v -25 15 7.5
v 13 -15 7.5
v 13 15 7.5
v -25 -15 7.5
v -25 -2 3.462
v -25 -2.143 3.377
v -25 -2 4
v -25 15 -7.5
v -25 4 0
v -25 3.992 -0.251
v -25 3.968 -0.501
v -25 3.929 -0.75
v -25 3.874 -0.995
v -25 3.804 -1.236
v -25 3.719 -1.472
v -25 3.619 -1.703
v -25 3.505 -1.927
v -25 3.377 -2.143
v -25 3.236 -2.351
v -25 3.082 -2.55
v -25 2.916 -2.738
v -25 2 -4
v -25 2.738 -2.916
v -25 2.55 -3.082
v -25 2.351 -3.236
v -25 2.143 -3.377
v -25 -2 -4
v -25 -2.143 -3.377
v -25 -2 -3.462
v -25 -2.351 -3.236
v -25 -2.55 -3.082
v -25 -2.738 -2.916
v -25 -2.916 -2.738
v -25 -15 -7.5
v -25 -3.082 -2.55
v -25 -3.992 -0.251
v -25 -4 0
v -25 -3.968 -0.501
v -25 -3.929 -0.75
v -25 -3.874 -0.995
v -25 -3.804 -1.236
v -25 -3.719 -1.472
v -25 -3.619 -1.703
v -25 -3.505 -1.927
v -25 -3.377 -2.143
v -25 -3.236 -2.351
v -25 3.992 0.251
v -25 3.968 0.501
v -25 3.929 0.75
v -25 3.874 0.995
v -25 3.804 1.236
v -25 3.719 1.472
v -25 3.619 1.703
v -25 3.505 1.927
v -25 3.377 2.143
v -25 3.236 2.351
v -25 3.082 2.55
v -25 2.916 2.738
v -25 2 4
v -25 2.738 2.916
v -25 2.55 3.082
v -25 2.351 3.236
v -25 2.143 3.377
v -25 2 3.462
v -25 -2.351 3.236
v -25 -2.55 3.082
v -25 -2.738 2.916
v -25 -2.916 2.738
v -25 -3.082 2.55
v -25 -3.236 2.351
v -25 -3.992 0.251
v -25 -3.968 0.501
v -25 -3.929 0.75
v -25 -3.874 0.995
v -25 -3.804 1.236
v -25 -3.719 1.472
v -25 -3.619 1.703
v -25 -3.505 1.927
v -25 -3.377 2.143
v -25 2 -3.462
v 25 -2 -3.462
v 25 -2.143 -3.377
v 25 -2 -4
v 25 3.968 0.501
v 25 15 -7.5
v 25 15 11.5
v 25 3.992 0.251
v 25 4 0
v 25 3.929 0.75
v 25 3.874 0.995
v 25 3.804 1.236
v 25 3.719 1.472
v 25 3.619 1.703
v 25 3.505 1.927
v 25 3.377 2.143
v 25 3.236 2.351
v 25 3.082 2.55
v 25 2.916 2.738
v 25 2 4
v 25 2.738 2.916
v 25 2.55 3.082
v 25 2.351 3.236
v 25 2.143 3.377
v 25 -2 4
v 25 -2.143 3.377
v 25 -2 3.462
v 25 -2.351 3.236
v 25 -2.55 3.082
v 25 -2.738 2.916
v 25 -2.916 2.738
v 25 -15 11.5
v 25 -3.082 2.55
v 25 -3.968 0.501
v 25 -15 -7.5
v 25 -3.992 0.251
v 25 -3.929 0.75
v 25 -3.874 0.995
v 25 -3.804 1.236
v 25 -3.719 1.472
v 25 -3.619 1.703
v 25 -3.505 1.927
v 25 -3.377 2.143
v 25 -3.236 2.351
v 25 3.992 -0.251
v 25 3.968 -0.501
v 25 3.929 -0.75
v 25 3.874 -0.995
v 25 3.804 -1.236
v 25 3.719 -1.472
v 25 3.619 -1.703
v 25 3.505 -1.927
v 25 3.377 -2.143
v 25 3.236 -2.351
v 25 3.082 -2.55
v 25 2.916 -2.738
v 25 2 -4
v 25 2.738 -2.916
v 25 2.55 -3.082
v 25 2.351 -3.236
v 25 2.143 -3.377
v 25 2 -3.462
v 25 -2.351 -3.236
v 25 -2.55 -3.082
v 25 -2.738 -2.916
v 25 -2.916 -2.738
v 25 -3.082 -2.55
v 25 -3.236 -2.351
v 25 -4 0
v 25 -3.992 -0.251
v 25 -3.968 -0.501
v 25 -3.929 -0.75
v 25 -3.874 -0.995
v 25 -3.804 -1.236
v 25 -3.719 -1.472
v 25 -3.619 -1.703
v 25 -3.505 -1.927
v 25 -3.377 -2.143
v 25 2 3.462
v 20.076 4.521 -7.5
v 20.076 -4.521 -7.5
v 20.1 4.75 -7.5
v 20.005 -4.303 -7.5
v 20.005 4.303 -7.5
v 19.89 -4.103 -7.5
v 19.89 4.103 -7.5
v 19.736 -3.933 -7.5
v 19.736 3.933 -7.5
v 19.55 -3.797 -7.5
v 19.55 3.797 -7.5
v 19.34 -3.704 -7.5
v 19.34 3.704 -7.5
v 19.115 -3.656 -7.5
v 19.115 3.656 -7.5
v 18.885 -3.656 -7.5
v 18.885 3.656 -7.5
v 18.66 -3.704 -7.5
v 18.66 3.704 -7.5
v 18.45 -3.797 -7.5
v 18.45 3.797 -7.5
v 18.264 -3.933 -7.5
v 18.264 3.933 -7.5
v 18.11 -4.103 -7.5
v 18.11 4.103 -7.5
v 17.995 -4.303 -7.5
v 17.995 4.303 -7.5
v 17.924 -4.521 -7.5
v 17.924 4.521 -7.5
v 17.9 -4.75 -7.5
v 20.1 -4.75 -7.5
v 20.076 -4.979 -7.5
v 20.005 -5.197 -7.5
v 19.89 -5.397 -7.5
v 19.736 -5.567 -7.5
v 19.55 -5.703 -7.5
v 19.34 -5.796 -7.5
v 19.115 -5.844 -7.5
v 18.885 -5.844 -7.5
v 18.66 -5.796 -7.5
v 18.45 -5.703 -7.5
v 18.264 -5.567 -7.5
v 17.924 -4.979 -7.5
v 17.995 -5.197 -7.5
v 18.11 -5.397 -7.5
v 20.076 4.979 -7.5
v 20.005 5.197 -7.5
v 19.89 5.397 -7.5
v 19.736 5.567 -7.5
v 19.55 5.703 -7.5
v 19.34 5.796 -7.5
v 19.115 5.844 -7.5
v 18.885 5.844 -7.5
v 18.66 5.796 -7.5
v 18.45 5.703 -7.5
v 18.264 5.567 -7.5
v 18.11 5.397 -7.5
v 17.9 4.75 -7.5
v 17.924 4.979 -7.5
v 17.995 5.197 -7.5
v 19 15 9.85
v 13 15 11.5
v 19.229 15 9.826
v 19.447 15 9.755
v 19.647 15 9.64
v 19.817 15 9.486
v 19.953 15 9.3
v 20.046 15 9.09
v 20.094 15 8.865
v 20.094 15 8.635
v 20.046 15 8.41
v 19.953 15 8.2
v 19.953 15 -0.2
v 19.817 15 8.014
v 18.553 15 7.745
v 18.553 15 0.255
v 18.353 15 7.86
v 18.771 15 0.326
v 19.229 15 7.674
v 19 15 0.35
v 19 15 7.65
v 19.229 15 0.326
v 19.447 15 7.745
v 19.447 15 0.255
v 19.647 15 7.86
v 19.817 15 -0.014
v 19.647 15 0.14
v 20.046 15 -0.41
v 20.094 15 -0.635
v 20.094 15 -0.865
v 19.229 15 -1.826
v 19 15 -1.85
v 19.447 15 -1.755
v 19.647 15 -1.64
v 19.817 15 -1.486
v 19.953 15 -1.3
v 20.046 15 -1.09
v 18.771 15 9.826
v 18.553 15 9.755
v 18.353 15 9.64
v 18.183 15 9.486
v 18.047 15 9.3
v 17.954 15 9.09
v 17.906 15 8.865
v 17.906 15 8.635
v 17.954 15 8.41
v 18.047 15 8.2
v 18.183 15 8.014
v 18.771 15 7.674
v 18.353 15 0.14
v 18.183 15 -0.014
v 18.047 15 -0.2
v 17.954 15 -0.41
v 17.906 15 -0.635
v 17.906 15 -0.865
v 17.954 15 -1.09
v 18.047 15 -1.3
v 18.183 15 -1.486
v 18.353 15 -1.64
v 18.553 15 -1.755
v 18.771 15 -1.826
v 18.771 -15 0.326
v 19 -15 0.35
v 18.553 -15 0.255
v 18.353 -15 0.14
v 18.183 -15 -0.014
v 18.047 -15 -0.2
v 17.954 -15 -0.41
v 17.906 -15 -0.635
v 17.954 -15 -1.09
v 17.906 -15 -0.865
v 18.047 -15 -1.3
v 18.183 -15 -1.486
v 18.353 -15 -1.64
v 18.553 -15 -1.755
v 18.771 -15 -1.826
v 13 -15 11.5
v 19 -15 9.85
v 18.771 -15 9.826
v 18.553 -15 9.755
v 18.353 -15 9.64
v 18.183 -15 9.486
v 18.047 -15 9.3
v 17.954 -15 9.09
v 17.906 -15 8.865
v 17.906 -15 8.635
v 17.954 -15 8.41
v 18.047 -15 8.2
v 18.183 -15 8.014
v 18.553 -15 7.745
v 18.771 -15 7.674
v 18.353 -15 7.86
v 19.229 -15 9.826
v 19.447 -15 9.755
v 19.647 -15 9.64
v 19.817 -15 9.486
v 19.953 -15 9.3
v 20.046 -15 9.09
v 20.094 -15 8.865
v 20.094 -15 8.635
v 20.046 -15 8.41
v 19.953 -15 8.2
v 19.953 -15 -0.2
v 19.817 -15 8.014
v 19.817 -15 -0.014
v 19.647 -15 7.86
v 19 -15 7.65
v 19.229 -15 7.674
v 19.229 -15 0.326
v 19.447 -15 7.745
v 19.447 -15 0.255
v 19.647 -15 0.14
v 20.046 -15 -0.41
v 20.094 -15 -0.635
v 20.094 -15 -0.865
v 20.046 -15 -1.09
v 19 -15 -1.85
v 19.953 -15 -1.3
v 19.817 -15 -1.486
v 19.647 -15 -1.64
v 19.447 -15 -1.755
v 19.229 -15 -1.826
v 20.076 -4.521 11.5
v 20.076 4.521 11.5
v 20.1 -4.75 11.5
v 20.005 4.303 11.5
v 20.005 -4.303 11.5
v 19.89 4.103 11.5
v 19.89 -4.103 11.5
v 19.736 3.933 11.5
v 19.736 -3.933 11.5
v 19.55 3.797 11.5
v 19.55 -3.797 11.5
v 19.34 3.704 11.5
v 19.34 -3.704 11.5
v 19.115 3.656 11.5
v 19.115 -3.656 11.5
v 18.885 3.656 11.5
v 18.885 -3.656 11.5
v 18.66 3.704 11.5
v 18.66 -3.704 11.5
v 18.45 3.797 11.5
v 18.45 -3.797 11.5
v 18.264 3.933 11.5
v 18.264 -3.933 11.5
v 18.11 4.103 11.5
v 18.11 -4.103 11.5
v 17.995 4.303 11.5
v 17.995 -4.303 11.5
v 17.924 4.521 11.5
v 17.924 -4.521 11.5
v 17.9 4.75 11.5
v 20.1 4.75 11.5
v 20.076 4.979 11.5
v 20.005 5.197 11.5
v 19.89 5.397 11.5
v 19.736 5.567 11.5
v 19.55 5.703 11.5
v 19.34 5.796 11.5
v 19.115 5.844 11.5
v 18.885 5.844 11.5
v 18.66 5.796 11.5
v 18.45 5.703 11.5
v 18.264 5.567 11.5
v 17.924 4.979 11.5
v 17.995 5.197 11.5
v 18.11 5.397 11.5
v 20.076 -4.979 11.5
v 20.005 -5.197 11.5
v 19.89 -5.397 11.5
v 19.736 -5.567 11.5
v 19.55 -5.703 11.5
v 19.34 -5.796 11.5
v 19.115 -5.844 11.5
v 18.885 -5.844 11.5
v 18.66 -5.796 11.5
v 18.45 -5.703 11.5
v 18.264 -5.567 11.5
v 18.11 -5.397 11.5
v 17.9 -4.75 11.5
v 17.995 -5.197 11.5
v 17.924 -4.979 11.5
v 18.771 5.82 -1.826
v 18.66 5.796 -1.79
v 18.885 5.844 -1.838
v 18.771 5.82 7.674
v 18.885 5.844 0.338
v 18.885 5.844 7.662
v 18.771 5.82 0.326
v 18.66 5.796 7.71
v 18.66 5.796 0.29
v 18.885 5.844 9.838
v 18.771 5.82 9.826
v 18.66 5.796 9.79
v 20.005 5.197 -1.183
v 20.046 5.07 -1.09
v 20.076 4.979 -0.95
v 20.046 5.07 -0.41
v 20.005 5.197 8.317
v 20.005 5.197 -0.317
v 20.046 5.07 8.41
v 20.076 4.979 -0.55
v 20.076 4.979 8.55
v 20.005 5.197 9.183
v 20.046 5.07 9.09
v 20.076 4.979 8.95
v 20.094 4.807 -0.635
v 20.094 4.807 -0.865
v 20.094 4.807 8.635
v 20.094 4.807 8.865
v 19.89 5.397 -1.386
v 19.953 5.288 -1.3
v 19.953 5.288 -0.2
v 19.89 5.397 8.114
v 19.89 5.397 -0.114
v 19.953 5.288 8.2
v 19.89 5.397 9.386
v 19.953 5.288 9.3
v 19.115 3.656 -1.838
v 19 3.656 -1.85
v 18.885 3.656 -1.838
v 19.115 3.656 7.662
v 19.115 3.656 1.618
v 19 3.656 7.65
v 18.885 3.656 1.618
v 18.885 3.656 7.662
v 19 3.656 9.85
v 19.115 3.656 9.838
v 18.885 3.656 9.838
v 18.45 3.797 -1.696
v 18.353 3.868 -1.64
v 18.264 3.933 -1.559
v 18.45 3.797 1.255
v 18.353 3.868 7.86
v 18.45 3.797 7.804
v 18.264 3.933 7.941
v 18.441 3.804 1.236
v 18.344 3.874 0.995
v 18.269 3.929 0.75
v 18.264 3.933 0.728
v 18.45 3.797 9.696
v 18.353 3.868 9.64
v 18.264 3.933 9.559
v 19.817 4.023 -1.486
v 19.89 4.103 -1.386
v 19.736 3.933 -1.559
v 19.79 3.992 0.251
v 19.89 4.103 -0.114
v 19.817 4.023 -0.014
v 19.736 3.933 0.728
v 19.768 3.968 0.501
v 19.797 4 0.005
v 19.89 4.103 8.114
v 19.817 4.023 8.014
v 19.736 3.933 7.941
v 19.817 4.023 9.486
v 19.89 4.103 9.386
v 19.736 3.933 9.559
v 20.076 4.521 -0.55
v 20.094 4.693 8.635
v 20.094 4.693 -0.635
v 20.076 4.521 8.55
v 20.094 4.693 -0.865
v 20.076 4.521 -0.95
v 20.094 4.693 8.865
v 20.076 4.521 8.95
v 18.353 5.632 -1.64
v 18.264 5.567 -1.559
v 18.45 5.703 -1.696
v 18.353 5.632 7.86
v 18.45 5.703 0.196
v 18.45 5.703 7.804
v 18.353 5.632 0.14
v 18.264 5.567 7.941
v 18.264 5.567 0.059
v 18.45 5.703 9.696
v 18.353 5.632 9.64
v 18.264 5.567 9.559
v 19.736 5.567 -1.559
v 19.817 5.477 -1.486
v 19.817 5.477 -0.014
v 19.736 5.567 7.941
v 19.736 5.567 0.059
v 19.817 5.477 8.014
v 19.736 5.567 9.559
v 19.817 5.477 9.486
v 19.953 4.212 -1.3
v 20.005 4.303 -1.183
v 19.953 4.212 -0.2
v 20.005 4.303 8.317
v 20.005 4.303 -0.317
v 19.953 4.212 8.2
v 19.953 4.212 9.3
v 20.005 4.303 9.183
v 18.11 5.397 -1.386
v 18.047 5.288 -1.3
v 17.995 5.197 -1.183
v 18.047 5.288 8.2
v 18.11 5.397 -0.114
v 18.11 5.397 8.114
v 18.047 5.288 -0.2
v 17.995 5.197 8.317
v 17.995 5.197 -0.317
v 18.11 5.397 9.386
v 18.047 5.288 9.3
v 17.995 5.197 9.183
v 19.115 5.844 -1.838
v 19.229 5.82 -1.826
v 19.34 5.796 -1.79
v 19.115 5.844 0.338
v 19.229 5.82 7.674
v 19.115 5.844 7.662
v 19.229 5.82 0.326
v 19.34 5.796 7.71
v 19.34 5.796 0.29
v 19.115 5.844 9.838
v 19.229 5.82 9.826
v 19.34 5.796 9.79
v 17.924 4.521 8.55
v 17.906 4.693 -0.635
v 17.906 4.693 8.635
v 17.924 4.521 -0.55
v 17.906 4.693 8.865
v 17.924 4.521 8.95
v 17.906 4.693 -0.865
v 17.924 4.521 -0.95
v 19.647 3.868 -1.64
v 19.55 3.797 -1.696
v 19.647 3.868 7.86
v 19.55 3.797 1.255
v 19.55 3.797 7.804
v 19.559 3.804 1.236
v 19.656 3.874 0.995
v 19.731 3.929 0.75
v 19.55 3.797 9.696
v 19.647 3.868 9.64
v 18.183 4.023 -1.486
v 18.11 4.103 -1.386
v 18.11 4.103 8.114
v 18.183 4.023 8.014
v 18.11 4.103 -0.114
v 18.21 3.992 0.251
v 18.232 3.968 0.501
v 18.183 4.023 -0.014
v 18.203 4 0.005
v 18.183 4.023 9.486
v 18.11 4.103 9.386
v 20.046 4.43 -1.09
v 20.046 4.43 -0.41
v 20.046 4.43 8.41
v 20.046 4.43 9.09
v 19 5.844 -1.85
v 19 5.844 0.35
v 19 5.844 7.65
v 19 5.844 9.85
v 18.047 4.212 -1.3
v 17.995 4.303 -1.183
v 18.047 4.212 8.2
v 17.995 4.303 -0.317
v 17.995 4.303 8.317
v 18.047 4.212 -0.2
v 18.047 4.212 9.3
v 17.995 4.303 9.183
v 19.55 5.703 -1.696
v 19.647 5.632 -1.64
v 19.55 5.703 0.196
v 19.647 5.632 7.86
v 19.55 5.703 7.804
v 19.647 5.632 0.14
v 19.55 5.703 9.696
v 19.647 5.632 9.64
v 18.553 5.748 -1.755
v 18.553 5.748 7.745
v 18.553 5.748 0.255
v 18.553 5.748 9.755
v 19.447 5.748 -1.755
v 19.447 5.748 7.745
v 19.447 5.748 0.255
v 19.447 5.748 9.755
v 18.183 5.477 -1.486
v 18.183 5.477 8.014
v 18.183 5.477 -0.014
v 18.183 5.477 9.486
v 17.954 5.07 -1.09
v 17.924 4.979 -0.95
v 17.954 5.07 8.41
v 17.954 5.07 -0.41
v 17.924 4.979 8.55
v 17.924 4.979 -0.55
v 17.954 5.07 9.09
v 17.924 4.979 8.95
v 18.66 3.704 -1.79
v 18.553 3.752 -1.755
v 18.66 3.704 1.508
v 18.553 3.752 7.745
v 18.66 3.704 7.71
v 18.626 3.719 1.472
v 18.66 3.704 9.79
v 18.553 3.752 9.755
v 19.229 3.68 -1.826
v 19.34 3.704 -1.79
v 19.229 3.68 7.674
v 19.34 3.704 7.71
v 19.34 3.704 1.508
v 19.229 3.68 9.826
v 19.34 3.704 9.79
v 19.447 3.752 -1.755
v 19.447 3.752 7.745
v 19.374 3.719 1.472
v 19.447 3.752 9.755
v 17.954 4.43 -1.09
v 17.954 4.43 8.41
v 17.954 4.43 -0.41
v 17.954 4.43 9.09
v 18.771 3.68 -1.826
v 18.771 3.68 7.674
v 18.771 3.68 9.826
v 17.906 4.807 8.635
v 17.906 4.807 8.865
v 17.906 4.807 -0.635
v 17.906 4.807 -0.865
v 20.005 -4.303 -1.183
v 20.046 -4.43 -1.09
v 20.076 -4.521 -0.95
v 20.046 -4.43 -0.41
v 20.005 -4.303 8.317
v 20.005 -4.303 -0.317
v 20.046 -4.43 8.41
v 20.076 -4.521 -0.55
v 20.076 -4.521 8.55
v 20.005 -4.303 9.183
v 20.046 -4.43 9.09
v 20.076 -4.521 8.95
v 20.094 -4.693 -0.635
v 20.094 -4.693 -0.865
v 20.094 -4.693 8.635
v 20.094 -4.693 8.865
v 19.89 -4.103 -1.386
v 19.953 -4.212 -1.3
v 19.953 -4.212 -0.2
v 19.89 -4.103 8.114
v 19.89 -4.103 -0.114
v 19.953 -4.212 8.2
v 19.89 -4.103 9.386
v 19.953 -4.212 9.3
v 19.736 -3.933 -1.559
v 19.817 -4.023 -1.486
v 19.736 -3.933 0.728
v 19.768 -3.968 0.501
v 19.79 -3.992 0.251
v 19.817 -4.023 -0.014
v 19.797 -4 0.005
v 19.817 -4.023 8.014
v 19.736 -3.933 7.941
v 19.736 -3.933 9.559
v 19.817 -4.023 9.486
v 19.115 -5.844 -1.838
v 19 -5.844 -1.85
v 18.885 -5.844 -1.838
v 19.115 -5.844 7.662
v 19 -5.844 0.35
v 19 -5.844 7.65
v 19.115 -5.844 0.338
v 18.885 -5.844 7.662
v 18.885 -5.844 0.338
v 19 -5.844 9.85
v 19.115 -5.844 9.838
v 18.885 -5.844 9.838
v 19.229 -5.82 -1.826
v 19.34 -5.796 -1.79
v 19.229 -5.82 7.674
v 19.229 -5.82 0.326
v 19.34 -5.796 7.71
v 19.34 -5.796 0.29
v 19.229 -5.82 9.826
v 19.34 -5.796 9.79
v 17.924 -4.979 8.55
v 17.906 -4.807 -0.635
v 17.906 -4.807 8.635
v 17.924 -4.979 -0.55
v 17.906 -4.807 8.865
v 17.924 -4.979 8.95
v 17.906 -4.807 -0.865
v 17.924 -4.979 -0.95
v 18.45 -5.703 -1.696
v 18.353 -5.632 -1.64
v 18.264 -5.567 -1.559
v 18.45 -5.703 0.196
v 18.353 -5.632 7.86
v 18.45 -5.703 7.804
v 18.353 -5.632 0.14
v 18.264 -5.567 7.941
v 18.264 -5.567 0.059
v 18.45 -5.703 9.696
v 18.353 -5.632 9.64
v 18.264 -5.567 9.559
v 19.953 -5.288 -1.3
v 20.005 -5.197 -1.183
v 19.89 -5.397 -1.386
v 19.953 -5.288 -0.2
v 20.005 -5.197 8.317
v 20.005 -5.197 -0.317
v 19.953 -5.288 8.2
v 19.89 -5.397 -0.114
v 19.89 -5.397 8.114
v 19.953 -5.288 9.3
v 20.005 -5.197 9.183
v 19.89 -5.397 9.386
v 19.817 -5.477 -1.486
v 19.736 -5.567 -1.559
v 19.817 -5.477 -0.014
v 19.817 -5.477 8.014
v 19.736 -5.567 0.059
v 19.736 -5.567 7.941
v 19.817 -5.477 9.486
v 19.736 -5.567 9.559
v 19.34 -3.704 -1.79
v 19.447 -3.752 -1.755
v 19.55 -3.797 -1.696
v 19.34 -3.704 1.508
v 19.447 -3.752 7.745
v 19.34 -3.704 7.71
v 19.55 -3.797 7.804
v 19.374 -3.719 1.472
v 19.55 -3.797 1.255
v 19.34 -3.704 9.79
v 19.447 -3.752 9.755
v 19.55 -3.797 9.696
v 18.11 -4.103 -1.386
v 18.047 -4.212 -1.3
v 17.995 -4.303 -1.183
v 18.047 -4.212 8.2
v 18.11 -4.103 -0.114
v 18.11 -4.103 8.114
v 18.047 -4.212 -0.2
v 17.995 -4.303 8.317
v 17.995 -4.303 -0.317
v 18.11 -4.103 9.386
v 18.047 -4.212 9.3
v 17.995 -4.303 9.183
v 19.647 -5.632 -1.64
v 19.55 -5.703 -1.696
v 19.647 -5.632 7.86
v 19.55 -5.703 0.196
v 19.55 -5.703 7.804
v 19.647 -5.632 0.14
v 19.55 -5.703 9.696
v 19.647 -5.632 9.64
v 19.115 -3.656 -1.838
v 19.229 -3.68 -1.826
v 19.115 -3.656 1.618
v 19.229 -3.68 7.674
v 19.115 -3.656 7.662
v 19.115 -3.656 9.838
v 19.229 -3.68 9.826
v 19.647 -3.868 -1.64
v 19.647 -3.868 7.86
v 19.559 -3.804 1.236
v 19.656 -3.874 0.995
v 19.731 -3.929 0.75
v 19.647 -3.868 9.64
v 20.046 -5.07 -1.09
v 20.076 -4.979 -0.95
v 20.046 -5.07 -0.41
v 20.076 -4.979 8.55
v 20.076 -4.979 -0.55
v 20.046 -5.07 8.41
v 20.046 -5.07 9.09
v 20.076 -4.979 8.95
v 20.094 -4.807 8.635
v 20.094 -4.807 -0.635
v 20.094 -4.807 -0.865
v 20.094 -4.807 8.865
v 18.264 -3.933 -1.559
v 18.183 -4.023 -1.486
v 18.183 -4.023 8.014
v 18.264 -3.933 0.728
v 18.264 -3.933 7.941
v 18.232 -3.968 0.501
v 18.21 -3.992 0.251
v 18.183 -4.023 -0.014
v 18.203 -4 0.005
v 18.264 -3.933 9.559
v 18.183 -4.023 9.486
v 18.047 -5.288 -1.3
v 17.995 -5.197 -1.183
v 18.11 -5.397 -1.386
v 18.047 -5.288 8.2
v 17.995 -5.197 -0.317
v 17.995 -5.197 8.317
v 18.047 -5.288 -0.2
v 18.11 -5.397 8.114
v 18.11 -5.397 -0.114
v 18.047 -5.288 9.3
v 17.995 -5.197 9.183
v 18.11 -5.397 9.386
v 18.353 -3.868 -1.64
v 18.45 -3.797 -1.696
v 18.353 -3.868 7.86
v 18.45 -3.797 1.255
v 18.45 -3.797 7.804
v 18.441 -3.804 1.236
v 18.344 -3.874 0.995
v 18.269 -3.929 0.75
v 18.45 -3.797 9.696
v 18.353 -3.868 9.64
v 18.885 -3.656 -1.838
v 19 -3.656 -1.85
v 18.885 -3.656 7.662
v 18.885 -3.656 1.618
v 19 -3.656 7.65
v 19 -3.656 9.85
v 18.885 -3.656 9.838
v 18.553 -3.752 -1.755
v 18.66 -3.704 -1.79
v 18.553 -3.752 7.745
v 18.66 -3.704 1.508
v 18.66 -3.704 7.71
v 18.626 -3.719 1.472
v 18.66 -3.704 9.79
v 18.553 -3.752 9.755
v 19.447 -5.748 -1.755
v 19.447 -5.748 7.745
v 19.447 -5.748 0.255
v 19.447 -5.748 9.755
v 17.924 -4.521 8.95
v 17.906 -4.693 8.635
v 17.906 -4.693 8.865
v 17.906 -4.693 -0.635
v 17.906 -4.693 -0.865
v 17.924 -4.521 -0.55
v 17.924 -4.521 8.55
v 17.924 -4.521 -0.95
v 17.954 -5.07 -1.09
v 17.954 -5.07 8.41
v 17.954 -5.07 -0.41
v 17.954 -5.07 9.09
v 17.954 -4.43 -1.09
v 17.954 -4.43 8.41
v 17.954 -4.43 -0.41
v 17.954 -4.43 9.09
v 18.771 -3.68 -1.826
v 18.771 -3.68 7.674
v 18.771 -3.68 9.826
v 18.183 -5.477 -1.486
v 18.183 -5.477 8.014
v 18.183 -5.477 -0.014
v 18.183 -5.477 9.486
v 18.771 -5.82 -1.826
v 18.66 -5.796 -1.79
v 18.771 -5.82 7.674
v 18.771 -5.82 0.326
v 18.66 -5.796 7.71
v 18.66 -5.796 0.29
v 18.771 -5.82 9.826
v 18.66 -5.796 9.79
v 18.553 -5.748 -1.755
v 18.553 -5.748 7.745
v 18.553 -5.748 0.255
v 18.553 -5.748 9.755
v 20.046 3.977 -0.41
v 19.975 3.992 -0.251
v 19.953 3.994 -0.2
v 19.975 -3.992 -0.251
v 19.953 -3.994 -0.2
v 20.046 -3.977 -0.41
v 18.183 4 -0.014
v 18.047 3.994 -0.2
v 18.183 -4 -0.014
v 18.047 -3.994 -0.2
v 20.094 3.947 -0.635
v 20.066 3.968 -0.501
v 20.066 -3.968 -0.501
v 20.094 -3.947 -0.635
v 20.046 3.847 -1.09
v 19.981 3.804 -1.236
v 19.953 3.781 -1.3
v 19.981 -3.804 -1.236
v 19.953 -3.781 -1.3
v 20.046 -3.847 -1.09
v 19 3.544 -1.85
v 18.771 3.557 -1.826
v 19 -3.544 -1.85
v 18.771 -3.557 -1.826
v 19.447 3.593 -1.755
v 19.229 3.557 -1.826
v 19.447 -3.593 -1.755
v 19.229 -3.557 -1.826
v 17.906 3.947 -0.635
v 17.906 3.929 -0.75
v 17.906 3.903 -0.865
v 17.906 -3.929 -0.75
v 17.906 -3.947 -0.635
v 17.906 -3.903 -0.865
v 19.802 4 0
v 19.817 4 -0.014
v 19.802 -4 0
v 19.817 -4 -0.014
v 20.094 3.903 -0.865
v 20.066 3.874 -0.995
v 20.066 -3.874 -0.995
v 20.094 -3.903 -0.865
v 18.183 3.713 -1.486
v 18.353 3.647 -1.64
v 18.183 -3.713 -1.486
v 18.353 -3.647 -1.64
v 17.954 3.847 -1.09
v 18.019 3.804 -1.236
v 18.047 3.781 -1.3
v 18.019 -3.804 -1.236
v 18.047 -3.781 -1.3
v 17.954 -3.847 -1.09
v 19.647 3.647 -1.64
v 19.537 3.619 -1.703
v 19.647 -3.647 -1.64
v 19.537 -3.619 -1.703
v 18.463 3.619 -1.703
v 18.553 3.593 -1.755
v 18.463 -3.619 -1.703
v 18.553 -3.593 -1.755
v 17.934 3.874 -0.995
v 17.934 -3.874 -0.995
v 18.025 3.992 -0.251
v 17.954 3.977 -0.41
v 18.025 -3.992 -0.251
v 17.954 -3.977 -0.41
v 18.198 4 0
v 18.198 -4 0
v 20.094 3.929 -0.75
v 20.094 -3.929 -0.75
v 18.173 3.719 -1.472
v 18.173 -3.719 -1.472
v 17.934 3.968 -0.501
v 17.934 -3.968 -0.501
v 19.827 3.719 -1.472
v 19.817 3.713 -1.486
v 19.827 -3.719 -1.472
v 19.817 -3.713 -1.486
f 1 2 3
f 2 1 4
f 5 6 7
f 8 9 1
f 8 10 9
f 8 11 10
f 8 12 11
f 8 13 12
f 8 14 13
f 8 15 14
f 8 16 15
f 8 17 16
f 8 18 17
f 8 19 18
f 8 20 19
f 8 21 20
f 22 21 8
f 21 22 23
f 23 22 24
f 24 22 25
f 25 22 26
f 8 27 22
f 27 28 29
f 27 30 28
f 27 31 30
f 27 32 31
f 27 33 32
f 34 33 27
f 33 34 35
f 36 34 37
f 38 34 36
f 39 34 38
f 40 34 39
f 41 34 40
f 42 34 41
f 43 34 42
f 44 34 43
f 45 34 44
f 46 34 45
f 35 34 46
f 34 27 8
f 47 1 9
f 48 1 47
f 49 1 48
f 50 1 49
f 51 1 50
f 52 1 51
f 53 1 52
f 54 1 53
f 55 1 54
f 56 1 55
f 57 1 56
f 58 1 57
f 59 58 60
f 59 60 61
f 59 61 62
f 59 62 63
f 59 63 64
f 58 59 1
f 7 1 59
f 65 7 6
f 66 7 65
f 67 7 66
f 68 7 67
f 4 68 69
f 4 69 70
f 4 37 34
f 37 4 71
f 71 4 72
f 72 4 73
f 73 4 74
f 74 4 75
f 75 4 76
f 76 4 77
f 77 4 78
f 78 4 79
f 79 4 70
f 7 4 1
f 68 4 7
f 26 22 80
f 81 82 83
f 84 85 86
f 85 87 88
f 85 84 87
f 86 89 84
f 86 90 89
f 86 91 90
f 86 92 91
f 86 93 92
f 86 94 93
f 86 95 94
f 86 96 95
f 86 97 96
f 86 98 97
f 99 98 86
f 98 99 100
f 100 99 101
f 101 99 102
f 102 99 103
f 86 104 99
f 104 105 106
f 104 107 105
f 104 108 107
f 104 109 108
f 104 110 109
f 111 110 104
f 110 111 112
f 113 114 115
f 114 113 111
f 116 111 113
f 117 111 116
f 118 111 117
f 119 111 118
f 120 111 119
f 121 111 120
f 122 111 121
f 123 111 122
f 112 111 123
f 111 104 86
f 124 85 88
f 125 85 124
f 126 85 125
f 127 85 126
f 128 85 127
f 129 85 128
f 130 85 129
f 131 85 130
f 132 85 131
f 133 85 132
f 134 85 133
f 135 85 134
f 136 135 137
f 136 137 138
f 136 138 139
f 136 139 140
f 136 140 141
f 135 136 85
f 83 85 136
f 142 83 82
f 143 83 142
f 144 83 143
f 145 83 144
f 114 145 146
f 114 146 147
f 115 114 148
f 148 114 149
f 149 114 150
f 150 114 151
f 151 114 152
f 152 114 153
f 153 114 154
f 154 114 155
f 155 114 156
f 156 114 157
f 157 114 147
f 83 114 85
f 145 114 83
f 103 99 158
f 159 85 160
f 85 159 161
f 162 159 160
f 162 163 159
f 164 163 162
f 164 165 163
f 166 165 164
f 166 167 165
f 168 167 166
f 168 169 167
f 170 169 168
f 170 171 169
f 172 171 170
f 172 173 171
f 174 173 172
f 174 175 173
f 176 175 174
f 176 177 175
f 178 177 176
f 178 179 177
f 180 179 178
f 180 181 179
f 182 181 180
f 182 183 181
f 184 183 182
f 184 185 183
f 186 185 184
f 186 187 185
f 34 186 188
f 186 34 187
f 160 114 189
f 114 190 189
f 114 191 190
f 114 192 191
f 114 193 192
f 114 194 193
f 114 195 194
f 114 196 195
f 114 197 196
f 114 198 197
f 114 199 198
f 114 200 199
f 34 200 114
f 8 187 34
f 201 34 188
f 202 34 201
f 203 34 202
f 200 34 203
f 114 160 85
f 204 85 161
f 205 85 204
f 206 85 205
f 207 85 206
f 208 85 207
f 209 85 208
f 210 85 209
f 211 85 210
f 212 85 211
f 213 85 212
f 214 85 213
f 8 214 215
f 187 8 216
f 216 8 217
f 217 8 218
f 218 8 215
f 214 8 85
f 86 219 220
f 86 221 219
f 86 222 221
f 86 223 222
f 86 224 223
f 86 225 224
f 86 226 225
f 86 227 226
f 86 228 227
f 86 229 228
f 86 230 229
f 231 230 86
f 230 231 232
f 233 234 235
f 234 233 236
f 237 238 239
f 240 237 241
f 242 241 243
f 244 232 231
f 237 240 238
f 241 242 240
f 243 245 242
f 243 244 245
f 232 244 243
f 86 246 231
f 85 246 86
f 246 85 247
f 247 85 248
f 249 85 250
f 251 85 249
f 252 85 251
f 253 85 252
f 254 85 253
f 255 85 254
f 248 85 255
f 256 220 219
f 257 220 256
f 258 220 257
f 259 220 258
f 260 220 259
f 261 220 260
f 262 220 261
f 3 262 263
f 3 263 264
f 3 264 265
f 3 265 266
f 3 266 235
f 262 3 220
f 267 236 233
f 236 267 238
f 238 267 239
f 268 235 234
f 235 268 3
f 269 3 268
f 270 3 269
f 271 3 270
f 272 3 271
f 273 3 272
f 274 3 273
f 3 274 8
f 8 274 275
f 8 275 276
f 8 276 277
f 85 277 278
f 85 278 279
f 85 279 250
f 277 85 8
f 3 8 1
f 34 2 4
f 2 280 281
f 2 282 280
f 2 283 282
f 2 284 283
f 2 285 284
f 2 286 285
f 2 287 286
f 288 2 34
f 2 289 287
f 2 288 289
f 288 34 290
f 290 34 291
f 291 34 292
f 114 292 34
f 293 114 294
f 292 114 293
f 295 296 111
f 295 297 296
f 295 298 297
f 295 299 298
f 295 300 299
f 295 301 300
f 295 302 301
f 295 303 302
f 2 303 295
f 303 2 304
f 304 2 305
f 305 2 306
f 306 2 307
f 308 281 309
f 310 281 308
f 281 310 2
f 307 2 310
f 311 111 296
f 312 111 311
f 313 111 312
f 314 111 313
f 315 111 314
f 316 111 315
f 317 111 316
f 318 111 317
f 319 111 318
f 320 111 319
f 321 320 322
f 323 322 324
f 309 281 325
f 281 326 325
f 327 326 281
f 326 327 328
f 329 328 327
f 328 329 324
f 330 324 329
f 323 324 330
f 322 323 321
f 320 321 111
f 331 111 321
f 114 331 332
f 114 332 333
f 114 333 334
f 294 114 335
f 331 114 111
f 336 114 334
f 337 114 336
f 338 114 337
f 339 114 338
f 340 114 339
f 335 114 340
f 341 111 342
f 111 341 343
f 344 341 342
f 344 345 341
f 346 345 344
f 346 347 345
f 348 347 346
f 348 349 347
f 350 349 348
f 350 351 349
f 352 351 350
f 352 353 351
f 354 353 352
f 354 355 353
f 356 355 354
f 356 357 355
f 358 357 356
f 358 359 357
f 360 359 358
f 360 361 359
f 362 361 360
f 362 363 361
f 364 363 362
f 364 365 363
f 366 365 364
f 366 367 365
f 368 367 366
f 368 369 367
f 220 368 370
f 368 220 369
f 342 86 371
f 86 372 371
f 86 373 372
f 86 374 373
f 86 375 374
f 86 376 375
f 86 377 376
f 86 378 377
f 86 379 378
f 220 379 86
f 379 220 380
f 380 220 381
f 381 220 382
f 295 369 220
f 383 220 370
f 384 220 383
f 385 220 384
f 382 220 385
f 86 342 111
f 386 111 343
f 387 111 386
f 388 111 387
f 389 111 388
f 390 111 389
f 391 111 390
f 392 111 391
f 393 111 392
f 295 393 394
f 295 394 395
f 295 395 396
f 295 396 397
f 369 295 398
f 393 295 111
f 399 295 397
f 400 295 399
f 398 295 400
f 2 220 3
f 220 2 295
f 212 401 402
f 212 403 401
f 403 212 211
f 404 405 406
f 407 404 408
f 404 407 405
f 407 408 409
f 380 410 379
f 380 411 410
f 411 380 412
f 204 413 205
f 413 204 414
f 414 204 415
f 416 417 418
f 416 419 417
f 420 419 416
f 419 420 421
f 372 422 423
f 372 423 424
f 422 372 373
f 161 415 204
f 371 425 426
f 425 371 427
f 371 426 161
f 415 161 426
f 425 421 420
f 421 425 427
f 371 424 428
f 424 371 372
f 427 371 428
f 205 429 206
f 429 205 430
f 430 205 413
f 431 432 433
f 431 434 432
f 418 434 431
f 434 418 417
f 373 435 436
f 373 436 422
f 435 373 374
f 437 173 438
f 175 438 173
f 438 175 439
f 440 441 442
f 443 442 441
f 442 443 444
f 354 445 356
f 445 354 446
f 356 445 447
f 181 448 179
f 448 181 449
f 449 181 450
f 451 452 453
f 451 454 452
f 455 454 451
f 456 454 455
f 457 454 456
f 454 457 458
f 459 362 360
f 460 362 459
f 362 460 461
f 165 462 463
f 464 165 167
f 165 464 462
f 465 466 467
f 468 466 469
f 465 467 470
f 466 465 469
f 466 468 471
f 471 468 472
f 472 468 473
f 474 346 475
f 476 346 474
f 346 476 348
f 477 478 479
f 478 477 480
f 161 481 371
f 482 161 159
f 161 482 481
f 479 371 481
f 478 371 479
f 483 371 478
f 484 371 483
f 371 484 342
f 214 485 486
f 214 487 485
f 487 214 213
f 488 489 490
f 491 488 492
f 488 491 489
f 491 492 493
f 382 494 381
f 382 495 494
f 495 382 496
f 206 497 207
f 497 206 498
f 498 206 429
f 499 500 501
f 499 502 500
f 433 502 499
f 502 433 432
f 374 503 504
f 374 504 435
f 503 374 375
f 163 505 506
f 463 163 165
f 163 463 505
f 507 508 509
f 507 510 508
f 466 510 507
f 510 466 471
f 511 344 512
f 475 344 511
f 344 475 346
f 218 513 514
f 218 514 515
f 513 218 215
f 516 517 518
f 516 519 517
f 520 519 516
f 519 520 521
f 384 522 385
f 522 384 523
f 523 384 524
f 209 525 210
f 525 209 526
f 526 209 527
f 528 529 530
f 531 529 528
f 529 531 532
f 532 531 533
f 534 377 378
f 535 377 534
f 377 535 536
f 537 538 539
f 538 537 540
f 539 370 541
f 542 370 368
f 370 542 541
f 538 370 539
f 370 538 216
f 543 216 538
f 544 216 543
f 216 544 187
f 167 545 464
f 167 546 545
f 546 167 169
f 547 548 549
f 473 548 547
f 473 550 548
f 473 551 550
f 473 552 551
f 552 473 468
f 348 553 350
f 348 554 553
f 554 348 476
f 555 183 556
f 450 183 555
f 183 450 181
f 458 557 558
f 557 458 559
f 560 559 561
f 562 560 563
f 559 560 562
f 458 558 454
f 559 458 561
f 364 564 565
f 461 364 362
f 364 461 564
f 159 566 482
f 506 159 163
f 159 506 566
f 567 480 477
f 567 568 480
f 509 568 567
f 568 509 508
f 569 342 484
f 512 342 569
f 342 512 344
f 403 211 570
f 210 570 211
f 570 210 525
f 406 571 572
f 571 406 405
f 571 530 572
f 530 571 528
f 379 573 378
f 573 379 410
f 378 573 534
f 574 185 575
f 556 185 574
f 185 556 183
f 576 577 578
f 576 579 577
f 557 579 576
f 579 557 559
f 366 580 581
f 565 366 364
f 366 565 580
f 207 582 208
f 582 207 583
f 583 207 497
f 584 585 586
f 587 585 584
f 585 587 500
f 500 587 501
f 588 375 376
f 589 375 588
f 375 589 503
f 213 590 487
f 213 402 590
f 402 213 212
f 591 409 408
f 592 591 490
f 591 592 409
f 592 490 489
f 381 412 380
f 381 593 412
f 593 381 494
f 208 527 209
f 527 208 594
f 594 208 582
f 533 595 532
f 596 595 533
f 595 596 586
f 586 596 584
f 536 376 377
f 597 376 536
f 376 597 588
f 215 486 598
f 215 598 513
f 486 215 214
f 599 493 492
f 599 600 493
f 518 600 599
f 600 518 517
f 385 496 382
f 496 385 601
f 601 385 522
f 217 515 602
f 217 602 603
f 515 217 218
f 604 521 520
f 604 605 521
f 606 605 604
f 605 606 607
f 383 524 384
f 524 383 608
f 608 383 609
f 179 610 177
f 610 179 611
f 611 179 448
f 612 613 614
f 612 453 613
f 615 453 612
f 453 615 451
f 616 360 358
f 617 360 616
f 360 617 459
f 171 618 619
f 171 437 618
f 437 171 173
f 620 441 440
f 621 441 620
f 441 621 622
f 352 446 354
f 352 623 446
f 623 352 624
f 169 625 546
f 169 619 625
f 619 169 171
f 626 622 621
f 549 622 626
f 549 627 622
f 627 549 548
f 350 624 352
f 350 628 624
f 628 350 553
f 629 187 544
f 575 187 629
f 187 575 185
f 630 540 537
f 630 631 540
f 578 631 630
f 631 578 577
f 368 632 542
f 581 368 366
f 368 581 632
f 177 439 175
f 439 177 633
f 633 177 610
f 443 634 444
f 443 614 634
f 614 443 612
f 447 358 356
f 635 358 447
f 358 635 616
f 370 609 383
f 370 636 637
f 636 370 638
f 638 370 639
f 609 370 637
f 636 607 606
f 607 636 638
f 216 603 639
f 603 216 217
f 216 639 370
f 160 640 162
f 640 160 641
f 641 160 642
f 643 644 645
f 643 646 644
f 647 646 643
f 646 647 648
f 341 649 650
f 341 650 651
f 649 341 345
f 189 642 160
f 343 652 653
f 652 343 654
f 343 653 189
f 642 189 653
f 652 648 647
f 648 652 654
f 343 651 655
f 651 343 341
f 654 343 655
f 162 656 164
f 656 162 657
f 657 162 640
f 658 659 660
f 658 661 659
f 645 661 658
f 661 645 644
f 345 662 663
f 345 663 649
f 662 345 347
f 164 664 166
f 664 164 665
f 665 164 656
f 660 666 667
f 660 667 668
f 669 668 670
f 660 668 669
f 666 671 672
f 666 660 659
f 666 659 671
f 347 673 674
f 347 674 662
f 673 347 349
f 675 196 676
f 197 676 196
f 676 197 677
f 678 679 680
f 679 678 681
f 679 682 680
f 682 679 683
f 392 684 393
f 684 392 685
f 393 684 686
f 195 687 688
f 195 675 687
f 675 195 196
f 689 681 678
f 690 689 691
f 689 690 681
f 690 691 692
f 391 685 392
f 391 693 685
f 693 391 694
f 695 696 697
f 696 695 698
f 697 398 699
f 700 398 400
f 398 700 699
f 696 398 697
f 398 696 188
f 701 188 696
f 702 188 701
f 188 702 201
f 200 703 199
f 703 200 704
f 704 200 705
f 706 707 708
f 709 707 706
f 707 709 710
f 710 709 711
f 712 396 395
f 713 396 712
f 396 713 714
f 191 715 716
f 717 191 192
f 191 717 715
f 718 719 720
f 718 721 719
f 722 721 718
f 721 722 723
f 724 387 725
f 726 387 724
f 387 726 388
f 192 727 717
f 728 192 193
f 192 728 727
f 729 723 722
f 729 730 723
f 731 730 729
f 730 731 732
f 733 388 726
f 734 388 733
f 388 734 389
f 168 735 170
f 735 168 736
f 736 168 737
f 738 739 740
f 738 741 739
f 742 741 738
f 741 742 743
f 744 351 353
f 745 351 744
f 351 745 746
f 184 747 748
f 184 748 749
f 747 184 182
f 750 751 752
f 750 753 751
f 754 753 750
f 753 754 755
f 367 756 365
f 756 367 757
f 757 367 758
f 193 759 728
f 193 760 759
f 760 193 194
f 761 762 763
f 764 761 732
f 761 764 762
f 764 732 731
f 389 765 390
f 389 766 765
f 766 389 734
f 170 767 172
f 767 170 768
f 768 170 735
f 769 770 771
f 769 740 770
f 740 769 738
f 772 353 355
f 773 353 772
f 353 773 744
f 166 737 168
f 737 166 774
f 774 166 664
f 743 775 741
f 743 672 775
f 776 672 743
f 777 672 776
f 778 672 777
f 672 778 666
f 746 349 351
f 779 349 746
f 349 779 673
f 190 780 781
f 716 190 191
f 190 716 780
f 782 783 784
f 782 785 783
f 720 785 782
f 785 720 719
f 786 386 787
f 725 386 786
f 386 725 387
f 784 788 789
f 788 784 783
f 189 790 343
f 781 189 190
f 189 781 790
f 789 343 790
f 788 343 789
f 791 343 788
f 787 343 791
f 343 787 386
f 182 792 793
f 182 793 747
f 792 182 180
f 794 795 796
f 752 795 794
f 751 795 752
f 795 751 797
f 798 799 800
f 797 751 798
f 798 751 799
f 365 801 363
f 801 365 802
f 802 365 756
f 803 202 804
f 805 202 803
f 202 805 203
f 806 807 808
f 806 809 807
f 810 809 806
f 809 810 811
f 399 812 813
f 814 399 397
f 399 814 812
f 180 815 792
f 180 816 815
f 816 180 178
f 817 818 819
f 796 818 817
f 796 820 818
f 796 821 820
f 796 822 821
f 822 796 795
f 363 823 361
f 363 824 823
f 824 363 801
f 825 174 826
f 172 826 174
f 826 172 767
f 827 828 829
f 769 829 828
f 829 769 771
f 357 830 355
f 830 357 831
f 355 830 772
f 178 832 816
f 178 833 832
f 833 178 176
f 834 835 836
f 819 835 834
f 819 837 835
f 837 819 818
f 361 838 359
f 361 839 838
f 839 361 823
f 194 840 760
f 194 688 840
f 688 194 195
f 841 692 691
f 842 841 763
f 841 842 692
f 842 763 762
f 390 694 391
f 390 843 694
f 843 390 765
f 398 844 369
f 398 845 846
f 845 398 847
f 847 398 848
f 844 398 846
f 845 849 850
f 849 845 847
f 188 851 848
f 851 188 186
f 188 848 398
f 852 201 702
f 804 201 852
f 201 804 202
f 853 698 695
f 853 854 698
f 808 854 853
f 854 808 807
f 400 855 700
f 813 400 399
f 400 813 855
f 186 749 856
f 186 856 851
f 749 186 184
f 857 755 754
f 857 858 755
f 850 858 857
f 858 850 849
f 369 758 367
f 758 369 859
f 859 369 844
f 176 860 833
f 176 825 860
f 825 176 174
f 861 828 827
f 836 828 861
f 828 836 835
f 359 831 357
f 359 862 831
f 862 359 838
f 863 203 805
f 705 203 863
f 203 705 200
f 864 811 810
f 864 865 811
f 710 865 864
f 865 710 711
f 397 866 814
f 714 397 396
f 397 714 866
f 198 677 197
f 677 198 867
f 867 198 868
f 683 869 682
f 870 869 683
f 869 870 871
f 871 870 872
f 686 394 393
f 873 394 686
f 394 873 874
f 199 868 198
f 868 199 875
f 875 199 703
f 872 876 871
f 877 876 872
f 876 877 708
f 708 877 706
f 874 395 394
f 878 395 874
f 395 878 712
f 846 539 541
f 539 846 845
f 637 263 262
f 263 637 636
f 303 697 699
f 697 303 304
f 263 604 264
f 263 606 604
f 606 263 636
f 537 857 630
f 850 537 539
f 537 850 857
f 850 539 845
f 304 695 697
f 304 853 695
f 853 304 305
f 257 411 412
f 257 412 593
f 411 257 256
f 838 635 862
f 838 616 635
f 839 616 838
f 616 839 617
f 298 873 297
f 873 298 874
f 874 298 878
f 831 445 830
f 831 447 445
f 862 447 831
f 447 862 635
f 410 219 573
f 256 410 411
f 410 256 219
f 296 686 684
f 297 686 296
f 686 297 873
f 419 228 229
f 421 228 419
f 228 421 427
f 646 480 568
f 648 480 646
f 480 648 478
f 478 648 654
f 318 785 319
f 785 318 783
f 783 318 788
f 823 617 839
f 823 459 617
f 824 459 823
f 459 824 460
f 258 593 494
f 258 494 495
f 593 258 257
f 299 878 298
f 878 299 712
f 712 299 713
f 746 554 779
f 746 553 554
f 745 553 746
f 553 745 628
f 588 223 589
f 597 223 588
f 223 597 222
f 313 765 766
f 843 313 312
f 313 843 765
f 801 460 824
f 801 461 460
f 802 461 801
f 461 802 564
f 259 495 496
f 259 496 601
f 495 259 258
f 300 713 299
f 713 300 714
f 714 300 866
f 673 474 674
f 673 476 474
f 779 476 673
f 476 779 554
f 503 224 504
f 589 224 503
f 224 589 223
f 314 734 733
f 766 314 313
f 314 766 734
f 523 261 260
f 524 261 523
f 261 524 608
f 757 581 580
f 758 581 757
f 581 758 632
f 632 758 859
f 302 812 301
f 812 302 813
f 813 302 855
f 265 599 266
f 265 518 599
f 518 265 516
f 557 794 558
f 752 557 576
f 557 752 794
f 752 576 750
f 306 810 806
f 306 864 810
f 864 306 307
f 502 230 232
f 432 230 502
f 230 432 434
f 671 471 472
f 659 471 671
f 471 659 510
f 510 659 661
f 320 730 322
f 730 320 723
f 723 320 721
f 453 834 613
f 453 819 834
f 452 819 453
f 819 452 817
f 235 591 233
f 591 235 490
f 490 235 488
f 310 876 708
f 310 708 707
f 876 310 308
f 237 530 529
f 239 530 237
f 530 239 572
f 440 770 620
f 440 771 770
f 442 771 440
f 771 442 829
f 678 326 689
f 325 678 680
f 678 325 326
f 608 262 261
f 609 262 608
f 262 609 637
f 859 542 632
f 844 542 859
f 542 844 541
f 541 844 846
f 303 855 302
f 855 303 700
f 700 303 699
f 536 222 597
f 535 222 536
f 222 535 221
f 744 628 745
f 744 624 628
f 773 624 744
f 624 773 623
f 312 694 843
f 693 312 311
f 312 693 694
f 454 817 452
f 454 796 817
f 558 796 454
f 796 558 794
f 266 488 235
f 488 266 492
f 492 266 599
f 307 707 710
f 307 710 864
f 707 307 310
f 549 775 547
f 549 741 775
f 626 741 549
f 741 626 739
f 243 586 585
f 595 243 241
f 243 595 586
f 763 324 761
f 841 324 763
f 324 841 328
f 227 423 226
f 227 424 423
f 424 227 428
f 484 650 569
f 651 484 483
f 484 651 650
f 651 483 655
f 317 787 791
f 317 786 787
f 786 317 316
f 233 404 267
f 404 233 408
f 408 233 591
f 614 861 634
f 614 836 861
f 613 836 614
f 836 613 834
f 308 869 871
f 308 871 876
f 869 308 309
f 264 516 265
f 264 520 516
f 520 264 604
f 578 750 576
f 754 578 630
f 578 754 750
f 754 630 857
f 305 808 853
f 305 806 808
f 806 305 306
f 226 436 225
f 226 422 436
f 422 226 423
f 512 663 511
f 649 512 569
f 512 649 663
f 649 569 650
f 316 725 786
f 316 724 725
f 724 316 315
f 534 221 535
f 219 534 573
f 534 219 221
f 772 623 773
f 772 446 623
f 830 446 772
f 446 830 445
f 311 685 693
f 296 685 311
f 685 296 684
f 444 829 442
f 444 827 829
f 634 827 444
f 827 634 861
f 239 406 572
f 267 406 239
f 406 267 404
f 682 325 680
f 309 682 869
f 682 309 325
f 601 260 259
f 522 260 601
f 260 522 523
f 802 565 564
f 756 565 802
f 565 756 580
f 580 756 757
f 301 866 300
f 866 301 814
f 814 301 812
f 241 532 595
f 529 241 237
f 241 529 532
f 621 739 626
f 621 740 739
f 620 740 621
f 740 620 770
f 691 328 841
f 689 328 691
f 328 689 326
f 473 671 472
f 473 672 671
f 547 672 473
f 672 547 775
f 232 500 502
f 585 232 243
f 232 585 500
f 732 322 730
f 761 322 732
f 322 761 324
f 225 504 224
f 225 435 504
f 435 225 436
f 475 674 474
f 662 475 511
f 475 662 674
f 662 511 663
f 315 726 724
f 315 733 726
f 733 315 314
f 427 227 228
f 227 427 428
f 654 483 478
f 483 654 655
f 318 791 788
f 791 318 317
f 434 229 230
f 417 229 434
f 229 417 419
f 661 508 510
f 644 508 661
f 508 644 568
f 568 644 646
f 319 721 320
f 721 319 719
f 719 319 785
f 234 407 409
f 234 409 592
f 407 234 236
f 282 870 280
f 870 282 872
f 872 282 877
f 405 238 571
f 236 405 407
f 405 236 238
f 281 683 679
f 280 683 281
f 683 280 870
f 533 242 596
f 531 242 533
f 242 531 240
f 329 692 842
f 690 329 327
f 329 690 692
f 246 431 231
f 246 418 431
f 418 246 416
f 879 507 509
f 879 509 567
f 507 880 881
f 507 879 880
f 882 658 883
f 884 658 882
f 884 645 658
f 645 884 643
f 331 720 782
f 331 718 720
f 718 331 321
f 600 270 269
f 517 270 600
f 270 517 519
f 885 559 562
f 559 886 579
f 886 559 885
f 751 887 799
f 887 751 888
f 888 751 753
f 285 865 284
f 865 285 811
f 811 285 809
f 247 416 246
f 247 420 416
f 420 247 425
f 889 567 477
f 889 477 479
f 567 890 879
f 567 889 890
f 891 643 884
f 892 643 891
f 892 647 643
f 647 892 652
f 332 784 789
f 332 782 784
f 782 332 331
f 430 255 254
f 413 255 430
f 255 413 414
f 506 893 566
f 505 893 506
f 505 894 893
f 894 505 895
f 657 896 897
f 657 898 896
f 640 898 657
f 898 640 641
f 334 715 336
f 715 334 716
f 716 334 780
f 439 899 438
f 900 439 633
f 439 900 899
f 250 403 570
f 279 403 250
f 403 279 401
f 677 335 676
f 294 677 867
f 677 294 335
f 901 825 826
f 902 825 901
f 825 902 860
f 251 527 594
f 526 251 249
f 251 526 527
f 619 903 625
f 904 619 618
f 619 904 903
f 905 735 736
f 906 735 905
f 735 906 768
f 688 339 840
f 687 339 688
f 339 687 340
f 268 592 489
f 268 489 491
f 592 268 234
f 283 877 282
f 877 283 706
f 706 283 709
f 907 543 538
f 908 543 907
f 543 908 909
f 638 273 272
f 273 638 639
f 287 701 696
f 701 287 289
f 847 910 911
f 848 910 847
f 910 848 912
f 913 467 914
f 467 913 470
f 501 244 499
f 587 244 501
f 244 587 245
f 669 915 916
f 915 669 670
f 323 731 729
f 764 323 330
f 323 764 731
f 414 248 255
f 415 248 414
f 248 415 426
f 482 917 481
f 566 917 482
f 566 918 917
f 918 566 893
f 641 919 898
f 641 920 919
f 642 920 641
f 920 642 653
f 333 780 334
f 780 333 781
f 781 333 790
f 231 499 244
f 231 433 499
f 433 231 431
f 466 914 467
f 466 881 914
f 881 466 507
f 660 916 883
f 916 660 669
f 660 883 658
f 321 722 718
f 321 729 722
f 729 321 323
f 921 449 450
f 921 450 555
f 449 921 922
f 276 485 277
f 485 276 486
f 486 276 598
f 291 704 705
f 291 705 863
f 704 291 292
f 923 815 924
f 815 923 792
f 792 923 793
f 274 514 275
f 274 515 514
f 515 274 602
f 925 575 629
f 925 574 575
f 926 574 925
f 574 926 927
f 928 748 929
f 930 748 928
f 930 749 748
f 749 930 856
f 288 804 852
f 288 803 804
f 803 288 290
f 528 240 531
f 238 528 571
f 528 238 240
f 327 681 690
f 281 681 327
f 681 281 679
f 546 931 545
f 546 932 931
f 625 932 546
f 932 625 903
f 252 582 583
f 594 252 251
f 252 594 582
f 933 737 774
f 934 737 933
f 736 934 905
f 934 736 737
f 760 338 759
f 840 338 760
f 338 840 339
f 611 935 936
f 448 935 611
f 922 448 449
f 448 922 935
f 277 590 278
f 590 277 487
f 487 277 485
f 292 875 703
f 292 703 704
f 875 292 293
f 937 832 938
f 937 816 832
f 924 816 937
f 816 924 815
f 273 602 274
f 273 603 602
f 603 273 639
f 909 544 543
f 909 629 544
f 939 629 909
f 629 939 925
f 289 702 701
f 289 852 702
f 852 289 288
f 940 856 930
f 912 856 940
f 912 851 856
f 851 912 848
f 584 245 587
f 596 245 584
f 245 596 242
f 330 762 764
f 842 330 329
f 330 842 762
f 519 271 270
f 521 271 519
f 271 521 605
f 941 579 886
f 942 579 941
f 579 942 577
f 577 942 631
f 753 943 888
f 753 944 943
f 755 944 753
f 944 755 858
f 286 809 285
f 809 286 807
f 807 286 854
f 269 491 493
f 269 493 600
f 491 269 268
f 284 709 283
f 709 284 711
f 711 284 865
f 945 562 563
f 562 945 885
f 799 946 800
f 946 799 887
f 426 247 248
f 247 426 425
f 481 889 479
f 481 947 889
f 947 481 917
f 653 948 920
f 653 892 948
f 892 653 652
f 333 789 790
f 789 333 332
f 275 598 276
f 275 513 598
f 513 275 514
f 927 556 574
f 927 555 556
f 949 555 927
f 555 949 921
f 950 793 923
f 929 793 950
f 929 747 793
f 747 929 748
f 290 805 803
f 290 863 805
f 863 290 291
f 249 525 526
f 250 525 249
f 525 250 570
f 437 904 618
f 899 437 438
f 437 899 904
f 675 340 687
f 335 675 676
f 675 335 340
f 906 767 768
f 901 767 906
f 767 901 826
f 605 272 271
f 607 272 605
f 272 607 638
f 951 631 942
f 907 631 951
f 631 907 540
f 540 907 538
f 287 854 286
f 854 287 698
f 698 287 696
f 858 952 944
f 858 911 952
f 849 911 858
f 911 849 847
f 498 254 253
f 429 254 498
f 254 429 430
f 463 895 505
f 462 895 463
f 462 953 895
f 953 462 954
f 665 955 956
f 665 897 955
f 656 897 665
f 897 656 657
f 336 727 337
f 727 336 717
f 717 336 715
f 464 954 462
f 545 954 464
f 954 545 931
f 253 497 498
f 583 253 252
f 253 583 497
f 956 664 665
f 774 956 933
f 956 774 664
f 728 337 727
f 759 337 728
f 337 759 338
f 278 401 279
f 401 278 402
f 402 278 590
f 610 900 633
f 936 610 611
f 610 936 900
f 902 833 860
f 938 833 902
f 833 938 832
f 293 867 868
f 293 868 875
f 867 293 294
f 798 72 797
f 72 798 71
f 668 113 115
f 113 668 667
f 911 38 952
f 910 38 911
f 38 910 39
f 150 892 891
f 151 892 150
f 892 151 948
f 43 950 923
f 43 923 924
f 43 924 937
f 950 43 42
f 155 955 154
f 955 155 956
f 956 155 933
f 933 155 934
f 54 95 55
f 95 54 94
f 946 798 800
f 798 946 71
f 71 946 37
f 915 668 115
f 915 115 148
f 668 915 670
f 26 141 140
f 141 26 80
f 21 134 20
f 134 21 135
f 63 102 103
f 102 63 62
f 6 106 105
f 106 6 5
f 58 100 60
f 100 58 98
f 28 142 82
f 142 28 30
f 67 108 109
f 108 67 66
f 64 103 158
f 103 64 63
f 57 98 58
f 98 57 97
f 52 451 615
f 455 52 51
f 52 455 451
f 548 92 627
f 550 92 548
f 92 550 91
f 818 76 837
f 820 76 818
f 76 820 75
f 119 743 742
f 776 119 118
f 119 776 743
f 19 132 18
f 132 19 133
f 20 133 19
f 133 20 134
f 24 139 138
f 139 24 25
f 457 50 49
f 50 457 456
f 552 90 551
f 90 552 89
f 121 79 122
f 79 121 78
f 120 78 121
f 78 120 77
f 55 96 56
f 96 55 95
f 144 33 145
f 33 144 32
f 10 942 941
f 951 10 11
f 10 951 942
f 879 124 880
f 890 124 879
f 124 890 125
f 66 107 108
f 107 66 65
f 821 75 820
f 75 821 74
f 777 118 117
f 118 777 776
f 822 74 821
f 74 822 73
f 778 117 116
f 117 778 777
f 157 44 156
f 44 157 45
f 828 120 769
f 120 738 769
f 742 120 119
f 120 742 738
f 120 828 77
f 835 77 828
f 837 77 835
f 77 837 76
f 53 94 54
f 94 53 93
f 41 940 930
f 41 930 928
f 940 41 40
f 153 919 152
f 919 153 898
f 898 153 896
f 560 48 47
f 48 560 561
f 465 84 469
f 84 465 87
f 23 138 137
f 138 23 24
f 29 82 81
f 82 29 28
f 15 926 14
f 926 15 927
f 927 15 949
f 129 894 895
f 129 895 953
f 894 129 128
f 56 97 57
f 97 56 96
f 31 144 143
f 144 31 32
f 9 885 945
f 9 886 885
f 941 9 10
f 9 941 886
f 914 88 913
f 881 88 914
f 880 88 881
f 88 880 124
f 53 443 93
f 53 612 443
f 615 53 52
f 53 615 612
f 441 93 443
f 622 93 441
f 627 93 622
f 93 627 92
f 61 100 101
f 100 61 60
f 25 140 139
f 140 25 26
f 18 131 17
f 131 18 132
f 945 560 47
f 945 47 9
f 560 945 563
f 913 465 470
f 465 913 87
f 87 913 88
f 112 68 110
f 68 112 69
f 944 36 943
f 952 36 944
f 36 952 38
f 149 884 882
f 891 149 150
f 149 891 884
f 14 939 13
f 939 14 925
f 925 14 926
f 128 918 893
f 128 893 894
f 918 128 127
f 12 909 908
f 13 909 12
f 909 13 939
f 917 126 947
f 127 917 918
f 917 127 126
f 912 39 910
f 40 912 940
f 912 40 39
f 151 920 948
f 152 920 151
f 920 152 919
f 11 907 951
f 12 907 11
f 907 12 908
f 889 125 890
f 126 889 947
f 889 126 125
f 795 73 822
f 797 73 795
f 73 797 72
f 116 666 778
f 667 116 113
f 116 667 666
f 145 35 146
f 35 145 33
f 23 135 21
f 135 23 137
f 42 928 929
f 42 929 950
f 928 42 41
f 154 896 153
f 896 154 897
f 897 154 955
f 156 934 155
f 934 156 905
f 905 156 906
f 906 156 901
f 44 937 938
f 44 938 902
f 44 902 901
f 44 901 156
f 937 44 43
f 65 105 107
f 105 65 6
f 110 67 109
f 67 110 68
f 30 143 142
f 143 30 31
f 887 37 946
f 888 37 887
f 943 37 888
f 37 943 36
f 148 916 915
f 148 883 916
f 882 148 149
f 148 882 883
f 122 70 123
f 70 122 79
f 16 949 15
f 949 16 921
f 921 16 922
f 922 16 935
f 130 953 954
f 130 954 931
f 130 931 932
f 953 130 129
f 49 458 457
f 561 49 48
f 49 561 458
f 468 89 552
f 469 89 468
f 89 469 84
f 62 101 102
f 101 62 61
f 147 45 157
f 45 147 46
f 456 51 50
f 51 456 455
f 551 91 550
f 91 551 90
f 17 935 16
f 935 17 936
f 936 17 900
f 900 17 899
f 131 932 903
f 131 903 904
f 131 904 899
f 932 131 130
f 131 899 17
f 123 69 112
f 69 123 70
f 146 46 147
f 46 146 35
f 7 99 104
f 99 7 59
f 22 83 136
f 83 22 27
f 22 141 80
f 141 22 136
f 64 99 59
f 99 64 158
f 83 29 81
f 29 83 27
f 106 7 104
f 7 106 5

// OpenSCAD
module rod_block(
                   width=60,
                   height=10,
                   depth=10,
                   rod_diameter=8.6,
                   endstop=false,
                   endstop_screw_size=2.2,
                   endstop_screw_sep=9.5,
                   endstop_screw_depth=15,
                   endstop_elevation=4
                   )
    {
    // x rod gaps  
  
    rotate([0,-90,0])
        difference(){
            union() {
                cube([height, depth, width], center=true);
                if(endstop)
                    translate([height/2+endstop_elevation/2 ,0,-width/2+endstop_screw_depth])
                        cube([endstop_elevation, depth, endstop_screw_depth*2], center=true);
                }                
                cylinder(h=2*width, r=rod_diameter/2, center=true, $fn=100);
                cube([rod_diameter, rod_diameter/2, 2*width], center=true);
                if(endstop) {
                    rotate([0,90,0]) {
                        translate([width/2-endstop_screw_depth,endstop_screw_sep/2,0])
                            cylinder(h=2*height+endstop_elevation*2, r=endstop_screw_size/2, center=true, $fn=30);
                        translate([width/2-endstop_screw_depth,-endstop_screw_sep/2,0])
                            cylinder(h=2*height+endstop_elevation*2, r=endstop_screw_size/2, center=true, $fn=30);
                    }
                    // {
                    translate([endstop_screw_sep/2+endstop_elevation, 0, -(width/2-endstop_screw_depth) ])
                        rotate([90,0,0])
                            cylinder(h=2*depth, r=endstop_screw_size/2, center=true, $fn=30);

                    translate([-endstop_screw_sep/2+endstop_elevation, 0, -(width/2-endstop_screw_depth)])
                        rotate([90,0,0])
                            cylinder(h=2*depth, r=endstop_screw_size/2, center=true, $fn=30);
                  //  }
                }
            }
    }

rod_block(width=50, 
           height=15, 
           depth=30,
           rod_diameter=8,
           endstop=true,
           endstop_screw_size=2.2,
           endstop_screw_sep=9.5,
           endstop_screw_depth=6);
